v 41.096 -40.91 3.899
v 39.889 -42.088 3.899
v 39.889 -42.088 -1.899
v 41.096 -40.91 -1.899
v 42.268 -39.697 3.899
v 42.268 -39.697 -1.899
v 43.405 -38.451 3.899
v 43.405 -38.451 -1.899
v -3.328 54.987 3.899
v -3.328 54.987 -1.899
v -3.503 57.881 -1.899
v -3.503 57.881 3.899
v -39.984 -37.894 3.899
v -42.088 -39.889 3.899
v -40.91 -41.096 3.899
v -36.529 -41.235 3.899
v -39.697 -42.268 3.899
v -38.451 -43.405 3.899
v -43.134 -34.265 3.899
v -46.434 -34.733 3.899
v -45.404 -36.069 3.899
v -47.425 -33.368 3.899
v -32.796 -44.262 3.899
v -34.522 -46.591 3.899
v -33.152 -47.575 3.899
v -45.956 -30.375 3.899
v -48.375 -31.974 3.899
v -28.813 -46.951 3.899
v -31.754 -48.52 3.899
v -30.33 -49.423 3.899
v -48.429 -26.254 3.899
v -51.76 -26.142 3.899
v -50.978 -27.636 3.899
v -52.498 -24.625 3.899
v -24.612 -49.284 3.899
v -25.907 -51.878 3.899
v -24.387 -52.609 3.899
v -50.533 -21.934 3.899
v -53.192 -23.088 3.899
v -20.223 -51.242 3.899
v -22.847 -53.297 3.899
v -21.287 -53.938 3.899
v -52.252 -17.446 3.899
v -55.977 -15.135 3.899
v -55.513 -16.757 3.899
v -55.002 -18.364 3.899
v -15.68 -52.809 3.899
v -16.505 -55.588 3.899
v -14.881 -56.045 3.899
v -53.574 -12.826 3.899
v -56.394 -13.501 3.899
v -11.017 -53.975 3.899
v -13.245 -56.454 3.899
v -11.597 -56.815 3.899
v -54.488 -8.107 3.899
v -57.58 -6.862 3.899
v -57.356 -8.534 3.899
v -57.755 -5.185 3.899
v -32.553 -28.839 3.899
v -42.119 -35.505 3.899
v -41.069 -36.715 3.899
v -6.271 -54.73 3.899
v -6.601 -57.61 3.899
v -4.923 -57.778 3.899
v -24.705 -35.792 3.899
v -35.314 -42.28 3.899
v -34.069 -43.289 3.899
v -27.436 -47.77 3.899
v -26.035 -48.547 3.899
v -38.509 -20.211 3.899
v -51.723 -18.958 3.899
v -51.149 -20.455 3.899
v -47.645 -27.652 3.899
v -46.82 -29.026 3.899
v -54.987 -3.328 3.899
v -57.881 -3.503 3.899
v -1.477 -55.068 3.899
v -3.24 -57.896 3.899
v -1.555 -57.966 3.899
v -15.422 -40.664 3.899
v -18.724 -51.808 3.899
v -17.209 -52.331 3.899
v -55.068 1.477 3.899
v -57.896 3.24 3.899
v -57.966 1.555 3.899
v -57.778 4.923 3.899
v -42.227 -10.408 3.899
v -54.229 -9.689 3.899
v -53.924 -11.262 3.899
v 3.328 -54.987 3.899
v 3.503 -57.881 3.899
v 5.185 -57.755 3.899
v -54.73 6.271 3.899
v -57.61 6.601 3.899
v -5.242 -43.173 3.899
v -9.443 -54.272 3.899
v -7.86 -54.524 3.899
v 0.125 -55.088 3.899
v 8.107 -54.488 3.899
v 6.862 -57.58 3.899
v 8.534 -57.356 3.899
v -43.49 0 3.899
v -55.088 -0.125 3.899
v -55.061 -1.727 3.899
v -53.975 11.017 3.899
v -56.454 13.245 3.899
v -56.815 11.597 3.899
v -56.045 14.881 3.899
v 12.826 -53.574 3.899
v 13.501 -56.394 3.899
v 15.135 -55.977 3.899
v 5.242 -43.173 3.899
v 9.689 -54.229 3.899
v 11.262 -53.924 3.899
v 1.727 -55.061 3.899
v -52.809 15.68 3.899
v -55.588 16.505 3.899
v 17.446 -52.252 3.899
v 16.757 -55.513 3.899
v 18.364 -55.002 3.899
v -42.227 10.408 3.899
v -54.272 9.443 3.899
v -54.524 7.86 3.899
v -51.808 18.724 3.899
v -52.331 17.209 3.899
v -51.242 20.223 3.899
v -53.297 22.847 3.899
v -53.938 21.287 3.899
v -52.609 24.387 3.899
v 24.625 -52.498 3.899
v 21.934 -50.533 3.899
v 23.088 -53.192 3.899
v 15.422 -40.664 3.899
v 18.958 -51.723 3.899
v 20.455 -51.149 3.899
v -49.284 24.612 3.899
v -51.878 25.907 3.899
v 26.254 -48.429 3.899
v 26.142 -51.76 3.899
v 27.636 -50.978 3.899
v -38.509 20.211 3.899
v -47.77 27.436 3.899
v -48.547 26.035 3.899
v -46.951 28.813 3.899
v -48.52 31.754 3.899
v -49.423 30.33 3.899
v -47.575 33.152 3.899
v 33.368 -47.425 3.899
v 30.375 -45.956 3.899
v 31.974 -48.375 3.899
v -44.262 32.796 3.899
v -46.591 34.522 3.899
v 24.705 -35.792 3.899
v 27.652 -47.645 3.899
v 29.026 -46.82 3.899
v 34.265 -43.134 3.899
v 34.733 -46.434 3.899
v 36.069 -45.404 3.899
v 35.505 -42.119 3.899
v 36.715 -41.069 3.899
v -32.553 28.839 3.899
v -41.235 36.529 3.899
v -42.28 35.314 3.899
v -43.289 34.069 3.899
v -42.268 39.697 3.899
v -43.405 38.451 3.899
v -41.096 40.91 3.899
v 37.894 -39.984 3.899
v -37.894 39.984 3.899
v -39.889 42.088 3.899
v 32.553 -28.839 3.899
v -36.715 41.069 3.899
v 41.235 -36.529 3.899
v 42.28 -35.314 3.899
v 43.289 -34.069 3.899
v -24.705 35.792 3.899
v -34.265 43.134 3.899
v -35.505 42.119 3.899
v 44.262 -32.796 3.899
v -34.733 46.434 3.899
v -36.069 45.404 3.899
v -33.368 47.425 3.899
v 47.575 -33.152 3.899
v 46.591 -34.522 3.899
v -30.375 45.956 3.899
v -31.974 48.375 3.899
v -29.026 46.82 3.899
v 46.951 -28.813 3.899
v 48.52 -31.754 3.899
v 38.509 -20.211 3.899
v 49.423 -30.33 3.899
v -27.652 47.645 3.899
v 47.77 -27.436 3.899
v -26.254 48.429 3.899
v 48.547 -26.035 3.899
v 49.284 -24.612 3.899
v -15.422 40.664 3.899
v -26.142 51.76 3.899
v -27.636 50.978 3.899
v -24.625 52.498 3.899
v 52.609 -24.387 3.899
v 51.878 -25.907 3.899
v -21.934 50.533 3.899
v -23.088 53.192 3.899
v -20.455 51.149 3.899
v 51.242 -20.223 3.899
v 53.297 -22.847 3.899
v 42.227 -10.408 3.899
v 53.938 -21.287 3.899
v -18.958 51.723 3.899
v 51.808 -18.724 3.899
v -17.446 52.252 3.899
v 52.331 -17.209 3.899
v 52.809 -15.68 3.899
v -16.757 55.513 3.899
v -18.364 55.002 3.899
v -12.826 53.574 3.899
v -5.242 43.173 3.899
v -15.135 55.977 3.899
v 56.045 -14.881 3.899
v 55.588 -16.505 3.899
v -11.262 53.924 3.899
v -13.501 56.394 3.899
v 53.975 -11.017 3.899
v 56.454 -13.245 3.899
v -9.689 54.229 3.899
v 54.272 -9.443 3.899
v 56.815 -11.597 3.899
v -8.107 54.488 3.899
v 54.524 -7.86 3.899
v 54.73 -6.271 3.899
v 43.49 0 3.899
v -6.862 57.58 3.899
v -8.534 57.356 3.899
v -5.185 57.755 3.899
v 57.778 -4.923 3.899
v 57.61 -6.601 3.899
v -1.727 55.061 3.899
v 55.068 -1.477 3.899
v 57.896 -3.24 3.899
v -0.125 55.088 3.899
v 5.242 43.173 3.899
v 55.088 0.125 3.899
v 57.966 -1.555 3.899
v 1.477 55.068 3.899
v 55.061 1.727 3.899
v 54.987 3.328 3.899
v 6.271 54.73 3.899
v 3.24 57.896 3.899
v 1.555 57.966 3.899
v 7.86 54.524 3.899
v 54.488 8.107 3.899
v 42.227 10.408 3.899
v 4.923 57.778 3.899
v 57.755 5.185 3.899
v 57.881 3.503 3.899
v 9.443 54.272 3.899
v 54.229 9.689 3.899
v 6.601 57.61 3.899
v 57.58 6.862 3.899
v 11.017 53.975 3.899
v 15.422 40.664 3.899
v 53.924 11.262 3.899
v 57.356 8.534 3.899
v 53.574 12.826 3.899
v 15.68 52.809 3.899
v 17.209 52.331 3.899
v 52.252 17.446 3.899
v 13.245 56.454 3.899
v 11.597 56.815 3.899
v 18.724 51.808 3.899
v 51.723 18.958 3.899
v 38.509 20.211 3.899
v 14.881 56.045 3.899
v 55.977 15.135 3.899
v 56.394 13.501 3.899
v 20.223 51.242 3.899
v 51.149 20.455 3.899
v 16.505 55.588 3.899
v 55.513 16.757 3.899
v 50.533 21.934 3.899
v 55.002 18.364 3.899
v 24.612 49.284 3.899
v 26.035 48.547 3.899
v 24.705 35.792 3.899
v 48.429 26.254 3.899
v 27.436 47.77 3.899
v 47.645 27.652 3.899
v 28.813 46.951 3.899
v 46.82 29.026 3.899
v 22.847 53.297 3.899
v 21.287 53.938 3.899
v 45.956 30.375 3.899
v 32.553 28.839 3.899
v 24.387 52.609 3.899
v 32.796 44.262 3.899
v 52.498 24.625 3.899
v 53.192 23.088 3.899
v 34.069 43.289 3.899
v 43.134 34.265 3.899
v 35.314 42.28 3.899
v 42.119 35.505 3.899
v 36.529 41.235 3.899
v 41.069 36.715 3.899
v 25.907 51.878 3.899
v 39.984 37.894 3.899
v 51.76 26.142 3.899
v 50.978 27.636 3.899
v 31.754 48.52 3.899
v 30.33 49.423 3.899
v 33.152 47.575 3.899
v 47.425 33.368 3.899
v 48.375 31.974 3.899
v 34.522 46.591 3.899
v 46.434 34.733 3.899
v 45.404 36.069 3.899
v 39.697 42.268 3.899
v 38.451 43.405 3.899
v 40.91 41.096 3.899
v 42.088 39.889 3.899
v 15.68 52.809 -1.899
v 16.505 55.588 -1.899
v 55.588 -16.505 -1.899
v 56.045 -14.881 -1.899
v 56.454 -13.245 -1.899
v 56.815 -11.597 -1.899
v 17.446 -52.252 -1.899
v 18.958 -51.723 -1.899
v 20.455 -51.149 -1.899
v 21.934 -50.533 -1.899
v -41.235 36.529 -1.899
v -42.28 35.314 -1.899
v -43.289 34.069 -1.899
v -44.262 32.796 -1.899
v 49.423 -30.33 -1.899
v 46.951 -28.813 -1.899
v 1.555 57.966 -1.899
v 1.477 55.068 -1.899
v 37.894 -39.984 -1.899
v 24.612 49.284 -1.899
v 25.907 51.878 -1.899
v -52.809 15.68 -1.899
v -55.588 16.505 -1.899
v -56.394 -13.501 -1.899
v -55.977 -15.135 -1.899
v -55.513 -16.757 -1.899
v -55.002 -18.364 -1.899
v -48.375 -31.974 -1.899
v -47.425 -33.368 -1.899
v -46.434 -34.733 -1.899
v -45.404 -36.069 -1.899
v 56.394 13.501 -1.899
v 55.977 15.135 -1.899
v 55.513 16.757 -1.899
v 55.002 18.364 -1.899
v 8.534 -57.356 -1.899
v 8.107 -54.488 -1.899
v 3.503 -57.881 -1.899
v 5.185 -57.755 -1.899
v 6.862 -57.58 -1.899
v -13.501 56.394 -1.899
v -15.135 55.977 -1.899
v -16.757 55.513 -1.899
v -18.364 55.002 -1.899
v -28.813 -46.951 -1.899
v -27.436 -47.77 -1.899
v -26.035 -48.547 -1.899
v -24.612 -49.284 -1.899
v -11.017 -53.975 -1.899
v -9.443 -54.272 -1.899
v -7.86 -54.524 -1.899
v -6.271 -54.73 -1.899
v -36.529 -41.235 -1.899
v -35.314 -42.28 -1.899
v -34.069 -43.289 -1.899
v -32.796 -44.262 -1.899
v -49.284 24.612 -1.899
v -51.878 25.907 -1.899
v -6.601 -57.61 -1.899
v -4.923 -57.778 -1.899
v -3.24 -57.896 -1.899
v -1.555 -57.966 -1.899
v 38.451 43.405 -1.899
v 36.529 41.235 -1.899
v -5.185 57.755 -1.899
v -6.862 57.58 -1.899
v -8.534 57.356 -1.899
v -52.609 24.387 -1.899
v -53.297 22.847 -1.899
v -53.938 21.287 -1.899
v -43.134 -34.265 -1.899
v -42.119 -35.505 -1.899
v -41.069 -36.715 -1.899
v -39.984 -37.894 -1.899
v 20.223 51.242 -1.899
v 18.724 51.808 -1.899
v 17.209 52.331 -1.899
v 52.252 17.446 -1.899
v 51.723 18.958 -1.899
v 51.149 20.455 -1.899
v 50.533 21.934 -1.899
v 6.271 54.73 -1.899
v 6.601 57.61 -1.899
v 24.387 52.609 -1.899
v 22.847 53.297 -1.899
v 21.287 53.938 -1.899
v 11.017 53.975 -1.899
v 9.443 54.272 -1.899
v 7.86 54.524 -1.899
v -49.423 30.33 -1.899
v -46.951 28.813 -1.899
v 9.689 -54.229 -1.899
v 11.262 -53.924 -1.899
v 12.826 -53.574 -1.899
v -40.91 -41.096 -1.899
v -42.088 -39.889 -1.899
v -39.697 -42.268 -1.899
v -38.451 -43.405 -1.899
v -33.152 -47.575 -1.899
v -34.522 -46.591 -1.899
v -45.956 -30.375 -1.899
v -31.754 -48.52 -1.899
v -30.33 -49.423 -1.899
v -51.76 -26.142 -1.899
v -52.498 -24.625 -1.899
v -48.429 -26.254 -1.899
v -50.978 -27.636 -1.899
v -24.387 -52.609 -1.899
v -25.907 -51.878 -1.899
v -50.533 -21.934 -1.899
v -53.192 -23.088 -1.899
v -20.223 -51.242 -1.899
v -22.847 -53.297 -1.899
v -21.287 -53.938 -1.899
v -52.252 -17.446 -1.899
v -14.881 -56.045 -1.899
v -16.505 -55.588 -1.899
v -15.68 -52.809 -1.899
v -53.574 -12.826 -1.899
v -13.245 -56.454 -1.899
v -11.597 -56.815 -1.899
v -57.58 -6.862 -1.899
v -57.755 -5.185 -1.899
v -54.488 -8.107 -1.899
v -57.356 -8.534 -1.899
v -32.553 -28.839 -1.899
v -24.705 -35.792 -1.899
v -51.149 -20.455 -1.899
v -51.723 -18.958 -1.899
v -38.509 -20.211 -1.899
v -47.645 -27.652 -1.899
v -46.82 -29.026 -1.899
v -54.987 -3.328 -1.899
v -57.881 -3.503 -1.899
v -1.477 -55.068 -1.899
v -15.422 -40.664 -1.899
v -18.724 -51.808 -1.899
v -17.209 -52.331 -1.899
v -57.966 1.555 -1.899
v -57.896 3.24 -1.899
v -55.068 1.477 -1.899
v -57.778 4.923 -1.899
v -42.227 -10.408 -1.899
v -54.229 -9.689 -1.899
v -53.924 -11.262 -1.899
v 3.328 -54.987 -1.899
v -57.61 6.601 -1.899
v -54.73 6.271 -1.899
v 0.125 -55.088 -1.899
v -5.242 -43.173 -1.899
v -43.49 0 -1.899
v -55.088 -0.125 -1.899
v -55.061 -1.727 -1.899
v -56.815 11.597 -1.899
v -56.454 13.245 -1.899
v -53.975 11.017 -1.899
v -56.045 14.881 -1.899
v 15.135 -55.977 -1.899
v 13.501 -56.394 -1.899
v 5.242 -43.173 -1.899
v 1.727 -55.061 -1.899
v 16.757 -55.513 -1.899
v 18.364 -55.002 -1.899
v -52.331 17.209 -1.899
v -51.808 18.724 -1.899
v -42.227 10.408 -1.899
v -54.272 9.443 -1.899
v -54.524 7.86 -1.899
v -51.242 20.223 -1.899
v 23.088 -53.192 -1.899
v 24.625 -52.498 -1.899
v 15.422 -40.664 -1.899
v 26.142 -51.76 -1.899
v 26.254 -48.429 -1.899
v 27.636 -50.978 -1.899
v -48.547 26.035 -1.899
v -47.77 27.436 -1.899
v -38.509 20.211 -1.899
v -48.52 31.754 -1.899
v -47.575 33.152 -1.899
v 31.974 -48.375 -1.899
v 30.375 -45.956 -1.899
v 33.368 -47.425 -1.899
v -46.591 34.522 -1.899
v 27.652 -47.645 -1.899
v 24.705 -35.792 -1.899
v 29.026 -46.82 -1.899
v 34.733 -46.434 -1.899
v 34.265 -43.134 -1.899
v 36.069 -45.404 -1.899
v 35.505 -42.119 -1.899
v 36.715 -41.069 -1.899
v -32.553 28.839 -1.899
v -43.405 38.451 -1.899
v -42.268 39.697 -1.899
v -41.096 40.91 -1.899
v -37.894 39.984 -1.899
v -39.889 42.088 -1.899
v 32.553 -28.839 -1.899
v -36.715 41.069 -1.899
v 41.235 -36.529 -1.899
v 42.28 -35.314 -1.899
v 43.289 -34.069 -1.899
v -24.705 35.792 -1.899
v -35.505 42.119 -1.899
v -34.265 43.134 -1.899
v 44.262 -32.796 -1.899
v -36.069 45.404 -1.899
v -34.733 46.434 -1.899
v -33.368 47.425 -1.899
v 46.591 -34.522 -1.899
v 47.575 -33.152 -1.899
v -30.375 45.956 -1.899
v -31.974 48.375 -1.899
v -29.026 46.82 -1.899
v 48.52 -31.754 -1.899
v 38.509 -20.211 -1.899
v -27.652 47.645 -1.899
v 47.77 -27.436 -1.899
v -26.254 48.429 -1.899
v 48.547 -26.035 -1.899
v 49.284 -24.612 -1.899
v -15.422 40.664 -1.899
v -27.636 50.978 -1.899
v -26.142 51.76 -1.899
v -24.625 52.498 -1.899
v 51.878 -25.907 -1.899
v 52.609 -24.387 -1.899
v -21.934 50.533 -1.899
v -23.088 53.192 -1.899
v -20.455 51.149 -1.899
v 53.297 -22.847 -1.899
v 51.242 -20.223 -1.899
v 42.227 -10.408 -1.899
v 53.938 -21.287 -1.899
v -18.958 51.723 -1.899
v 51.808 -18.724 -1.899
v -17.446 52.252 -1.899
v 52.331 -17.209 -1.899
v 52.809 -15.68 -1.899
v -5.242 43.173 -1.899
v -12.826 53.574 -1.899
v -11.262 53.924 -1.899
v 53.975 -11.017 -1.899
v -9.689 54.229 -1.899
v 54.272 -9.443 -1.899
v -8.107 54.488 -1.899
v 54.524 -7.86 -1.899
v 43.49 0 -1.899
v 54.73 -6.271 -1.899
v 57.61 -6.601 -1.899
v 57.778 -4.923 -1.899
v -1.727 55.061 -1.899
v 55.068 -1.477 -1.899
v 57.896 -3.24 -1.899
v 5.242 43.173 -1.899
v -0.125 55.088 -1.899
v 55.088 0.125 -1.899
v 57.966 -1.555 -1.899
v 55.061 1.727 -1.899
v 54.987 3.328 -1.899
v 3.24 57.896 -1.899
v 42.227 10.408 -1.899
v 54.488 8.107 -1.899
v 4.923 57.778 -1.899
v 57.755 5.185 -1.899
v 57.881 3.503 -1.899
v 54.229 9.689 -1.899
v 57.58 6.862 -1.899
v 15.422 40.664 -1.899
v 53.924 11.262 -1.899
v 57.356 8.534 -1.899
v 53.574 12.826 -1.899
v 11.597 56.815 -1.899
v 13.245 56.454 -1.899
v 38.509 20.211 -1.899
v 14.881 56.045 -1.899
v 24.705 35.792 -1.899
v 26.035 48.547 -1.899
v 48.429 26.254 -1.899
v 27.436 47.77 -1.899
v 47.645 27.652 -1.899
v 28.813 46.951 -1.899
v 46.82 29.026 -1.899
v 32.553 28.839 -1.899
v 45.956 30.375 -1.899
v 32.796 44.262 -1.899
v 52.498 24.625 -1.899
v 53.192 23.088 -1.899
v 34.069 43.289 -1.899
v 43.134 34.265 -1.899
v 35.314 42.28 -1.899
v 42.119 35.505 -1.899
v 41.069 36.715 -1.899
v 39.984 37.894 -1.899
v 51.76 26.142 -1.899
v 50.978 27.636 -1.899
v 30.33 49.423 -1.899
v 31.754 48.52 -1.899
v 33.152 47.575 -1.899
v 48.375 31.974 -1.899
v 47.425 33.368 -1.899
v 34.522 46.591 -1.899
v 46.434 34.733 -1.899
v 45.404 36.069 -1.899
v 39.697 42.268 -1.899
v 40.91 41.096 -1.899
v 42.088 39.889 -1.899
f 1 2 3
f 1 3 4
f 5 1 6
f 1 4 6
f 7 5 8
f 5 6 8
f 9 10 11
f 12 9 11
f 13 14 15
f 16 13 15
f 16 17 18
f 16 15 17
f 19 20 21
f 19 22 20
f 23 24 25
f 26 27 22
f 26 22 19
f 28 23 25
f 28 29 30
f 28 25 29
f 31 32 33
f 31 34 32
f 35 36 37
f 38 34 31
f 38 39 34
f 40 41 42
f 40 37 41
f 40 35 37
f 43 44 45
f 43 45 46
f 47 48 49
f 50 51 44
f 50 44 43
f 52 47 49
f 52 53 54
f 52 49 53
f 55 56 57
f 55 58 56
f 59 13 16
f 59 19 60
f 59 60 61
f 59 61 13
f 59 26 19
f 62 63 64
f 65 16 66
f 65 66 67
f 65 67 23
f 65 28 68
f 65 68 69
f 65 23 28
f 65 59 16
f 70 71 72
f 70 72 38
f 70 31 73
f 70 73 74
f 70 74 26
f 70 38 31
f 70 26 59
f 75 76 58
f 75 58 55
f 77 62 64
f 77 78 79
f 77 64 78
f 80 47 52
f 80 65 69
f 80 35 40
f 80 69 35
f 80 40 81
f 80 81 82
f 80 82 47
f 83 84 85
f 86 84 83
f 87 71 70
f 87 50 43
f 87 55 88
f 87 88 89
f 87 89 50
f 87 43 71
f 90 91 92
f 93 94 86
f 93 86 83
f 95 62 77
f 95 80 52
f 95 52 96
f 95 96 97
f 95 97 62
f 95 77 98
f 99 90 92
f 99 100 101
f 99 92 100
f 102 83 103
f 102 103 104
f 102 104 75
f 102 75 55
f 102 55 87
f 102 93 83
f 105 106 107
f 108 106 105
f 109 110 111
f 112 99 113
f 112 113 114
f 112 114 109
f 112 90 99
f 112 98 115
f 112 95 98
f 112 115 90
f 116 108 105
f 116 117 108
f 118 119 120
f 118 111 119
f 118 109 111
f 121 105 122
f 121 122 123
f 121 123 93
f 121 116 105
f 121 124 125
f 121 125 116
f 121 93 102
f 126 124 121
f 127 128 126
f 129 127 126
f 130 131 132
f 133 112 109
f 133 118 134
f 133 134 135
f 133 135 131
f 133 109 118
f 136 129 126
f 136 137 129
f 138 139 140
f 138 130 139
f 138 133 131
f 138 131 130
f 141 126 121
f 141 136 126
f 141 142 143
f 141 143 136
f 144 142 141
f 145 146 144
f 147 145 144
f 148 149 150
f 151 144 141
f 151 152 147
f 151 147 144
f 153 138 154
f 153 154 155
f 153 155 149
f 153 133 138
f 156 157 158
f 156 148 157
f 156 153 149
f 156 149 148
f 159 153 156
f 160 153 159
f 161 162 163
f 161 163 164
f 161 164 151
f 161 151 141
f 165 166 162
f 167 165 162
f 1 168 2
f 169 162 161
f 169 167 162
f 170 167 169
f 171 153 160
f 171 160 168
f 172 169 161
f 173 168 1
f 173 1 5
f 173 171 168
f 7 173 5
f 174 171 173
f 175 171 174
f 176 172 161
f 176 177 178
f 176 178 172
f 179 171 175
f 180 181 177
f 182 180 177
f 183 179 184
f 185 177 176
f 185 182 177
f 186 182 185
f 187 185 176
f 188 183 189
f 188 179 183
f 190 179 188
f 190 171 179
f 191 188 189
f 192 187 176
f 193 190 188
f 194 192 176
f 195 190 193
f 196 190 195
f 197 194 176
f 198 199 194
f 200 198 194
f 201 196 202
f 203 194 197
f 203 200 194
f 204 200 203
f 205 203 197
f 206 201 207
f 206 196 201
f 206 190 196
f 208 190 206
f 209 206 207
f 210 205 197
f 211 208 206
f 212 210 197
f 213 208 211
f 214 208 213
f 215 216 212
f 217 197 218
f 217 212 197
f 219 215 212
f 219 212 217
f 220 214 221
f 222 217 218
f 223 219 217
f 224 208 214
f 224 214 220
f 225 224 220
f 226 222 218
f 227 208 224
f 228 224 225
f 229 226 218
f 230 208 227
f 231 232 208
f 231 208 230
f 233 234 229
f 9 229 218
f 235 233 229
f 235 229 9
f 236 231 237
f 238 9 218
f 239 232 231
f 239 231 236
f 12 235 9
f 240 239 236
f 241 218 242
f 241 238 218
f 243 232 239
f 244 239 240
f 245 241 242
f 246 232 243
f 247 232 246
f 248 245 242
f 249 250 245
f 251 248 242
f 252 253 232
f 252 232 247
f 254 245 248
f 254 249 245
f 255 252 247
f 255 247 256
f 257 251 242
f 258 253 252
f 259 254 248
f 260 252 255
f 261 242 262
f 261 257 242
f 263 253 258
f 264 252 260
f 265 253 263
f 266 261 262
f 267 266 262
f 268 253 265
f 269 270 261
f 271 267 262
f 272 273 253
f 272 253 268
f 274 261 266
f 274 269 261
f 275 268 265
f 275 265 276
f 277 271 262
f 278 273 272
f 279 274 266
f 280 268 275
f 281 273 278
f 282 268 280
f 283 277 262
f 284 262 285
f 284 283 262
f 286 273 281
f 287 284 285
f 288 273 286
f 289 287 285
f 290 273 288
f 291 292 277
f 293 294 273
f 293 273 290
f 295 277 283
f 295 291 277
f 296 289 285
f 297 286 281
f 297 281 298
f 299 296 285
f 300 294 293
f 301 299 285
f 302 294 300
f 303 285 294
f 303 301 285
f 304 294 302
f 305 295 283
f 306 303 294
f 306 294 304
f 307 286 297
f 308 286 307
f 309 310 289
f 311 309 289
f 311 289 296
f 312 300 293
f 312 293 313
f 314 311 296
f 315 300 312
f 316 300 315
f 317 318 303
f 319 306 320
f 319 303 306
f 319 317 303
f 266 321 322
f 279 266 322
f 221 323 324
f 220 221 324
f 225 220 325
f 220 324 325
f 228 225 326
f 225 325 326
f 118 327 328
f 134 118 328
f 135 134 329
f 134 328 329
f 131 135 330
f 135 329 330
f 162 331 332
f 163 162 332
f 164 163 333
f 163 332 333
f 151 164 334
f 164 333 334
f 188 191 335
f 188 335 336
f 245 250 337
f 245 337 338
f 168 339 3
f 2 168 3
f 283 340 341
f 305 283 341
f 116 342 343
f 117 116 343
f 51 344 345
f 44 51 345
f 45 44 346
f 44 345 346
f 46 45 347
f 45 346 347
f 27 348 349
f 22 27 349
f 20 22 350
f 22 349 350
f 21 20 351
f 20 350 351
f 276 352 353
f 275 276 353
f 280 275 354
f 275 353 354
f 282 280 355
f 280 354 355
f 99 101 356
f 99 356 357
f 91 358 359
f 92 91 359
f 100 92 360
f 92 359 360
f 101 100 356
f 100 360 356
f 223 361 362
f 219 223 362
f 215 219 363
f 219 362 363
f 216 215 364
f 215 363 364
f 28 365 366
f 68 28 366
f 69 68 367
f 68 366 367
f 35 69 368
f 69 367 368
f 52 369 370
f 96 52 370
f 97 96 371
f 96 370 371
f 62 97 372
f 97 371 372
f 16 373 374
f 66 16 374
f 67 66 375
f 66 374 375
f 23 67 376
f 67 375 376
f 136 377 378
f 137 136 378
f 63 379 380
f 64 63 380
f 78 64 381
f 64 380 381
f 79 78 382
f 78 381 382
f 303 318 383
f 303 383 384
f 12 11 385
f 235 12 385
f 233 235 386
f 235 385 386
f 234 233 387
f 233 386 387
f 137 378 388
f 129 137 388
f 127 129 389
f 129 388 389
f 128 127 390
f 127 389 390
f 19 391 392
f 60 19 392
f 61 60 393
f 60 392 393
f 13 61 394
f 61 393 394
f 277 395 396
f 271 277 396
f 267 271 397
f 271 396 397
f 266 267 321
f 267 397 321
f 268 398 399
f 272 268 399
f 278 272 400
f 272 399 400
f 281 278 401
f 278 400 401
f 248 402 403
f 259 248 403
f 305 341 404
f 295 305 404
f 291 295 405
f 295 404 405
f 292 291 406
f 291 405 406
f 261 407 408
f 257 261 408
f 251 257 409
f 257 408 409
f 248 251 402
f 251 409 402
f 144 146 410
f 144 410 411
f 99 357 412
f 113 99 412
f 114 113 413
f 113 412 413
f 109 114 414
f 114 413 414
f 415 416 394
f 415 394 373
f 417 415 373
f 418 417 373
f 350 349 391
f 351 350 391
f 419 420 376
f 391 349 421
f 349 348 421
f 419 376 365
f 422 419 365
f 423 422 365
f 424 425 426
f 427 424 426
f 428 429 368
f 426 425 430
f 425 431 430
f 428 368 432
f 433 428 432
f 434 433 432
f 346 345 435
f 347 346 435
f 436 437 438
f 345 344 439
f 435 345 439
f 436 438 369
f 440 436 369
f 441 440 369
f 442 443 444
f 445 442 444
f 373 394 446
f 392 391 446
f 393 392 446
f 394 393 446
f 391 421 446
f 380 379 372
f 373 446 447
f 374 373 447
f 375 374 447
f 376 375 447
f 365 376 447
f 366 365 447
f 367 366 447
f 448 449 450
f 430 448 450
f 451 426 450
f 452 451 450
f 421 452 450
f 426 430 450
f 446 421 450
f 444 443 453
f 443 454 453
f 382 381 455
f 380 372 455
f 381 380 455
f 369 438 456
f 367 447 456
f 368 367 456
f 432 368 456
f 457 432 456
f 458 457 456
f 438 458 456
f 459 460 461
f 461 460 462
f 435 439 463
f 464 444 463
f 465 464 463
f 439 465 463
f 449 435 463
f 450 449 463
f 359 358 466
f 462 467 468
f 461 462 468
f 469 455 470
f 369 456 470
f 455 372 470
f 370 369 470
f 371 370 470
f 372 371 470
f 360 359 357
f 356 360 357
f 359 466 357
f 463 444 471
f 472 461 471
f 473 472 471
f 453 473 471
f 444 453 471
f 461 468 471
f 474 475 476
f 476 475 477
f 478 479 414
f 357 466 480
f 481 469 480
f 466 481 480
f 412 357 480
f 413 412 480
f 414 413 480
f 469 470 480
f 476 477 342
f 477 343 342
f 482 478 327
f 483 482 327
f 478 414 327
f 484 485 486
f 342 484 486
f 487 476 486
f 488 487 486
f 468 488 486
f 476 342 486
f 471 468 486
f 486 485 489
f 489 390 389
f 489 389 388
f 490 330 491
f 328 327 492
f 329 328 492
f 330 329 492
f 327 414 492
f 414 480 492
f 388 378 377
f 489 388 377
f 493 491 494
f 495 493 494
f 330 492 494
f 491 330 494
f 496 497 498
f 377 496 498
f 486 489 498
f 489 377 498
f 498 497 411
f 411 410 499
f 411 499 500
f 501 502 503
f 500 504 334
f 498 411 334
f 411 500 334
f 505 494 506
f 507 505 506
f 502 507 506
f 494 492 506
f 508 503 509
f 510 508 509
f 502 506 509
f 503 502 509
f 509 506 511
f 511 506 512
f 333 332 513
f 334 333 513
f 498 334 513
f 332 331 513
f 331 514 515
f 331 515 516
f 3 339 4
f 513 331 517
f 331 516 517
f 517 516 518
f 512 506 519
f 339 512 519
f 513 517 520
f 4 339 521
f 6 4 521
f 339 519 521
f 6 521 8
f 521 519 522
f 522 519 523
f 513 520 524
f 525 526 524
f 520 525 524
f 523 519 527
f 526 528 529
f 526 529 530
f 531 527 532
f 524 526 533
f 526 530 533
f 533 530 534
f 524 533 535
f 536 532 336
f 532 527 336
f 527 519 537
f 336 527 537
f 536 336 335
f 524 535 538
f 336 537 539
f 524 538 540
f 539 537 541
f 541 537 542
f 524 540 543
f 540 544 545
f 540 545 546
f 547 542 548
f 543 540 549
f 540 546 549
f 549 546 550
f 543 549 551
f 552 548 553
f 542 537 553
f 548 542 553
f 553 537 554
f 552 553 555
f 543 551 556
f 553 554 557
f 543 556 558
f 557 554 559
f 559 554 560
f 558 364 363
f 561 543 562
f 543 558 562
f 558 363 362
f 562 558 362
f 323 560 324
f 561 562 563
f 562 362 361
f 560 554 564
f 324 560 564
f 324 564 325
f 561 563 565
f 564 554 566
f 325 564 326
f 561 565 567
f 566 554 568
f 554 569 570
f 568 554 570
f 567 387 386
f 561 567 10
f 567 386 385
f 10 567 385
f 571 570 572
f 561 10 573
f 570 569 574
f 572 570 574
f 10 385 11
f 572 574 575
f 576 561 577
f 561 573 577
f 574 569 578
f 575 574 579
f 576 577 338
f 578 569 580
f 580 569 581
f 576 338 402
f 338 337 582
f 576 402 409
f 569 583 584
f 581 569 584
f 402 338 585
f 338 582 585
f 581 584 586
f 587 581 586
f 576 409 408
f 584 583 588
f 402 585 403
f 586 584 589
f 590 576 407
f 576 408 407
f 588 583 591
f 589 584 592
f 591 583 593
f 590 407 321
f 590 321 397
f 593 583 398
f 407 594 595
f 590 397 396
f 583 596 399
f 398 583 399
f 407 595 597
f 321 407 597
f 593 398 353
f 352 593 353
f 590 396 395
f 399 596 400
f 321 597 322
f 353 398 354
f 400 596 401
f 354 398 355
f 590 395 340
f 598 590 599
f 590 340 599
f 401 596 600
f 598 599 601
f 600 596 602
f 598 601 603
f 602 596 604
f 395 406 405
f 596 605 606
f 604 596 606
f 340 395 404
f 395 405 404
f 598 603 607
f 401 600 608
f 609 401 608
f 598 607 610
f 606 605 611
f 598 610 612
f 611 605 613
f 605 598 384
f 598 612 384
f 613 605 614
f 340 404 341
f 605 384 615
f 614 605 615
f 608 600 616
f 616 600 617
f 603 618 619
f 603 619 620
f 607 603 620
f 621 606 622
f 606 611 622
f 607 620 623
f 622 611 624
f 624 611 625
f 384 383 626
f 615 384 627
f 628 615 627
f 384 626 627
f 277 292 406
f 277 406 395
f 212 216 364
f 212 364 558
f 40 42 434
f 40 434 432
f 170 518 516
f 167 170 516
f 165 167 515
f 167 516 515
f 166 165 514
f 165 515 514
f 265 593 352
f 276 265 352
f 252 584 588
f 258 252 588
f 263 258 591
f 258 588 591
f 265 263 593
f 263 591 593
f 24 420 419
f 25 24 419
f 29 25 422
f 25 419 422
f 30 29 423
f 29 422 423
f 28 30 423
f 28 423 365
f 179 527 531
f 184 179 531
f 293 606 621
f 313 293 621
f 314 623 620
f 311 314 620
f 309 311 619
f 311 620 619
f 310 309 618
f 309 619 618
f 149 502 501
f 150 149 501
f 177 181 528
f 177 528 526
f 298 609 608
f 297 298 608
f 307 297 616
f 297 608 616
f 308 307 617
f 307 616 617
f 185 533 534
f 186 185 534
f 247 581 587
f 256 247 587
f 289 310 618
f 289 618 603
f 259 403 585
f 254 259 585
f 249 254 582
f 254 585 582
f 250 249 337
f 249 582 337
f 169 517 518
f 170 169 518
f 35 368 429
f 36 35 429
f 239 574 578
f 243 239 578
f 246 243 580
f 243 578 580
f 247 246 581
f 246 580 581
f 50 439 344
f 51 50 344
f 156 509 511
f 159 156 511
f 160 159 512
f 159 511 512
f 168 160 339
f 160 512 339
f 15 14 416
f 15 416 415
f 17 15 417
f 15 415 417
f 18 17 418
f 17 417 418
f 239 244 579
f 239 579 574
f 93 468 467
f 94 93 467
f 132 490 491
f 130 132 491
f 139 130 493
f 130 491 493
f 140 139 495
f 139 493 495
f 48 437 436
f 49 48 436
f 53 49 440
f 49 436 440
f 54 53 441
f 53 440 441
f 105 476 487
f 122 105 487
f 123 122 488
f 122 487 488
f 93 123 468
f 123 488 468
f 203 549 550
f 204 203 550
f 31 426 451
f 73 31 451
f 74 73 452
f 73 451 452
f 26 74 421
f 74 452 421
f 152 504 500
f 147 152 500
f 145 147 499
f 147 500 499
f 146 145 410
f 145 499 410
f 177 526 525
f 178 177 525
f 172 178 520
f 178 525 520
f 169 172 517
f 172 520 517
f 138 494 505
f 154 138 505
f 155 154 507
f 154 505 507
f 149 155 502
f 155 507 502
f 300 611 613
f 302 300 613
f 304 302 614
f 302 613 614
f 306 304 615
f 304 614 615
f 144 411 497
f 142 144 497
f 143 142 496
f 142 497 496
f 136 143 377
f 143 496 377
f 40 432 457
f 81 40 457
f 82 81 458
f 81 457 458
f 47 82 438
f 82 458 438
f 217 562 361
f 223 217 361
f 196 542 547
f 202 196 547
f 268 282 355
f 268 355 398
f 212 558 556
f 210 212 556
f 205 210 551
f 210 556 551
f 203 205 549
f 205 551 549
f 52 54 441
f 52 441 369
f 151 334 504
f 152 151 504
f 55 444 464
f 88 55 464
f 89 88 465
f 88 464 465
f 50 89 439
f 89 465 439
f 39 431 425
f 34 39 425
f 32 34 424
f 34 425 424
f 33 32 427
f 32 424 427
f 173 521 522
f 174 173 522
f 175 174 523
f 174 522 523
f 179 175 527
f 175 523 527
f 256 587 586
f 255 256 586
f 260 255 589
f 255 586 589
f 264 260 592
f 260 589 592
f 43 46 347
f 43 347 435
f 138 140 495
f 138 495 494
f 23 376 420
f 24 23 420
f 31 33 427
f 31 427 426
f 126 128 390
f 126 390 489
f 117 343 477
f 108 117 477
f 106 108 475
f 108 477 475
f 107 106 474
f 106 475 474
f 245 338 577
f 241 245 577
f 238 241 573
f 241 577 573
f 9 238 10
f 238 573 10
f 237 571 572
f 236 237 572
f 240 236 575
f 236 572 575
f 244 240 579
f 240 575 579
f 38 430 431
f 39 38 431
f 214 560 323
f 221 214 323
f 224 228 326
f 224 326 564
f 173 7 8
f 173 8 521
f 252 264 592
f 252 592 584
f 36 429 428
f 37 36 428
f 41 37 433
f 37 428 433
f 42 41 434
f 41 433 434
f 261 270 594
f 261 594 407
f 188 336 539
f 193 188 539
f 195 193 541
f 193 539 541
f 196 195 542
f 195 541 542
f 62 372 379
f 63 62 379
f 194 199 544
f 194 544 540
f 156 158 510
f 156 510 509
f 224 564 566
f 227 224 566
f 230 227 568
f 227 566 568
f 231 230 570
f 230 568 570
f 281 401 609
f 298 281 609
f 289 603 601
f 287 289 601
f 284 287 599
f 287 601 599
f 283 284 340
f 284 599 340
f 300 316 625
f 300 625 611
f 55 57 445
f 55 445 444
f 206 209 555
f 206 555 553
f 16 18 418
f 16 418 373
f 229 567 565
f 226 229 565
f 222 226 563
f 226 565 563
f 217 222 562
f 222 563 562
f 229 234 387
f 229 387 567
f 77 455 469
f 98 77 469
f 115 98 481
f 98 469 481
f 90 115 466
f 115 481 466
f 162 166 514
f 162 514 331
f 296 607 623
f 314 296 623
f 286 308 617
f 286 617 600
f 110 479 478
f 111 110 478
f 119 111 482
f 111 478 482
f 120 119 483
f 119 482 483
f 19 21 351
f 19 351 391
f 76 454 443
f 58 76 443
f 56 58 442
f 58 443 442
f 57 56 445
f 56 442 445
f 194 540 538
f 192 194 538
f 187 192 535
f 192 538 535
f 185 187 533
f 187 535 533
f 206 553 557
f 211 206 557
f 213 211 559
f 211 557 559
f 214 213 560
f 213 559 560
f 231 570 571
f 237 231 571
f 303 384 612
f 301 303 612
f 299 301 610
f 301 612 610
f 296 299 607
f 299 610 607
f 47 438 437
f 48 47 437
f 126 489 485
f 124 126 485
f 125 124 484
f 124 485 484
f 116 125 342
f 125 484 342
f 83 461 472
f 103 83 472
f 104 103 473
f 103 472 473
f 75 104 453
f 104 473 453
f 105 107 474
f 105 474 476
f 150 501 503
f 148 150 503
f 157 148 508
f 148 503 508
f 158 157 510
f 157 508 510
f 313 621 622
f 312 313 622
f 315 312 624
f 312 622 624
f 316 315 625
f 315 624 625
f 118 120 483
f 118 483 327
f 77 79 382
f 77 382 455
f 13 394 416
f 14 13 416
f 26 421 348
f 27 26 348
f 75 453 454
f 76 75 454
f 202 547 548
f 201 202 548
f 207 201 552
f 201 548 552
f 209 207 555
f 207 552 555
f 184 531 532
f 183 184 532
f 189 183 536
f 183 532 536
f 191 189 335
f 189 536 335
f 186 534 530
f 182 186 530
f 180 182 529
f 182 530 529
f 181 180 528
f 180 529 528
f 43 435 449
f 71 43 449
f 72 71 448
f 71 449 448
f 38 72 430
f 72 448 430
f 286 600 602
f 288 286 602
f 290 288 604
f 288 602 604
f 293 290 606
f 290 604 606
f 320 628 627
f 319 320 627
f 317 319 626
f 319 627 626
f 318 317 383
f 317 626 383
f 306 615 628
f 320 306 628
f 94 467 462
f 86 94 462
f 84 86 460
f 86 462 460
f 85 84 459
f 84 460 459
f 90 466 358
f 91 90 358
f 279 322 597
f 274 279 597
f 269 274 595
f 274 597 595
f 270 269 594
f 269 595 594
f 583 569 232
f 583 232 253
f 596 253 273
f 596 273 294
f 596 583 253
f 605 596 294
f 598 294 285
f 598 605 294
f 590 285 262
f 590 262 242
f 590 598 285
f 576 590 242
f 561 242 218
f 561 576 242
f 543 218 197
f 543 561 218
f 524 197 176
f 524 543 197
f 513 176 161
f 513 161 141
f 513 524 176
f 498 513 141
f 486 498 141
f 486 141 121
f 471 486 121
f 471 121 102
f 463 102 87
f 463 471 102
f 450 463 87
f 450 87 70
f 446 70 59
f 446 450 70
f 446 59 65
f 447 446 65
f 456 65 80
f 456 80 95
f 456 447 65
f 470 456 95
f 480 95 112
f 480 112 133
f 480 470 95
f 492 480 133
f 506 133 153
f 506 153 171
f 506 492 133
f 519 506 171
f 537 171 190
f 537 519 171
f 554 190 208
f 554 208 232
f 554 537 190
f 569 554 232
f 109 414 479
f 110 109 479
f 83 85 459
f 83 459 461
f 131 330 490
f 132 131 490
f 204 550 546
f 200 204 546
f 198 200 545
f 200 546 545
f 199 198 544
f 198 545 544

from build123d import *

# Parameters (mm, degrees)
SKETCH1_R           = 20
SKETCH1_R_2         = 15
BOSS_EXTRUDE1_DEPTH = 2
CUT_EXTRUDE1_START  = -2
CUT_EXTRUDE1_DEPTH  = 2
CIRPATTERN1_COUNT   = 36
SCALE1_SCALE        = 1.9329
SCALE2_SCALE        = 1.5


with BuildPart() as part:
    # Sketch1 → Boss-Extrude1 (new body)
    with BuildSketch(Plane.XY):
        Circle(SKETCH1_R)
        Circle(SKETCH1_R_2, mode=Mode.SUBTRACT)
    extrude(amount=BOSS_EXTRUDE1_DEPTH)

    # Sketch2 → Cut-Extrude1 (cut)
    with BuildSketch(Plane.XY.offset(2).offset(CUT_EXTRUDE1_START)):
        with BuildLine():
            Line((-18.47787485, -4.423589156), (-19.450394579, -4.656409638))
            ThreePointArc((-19.450394579, -4.656409638), (-19.634991849, -3.803563472), (-19.782212796, -2.943477007))
            Line((-19.782212796, -2.943477007), (-18.793102156, -2.796303156))
            ThreePointArc((-18.793102156, -2.796303156), (-18.653242257, -3.613385298), (-18.47787485, -4.423589156))
        make_face()
    cut_extrude1 = extrude(amount=CUT_EXTRUDE1_DEPTH, mode=Mode.SUBTRACT)

    # CirPattern1: Cut-Extrude1 ×36 about axis
    cirpattern1_axis = Axis((0, 0, 0), (0, 0, 1))
    for i in range(1, CIRPATTERN1_COUNT):
        add(cut_extrude1.rotate(cirpattern1_axis, i * 360 / CIRPATTERN1_COUNT), mode=Mode.SUBTRACT)


with BuildPart() as part_1:
    # Scale1: scaled about (0, 0, 1)
    add(part.part.scale(SCALE1_SCALE).moved(Location((0, 0, -0.9329))))


with BuildPart() as part_2:
    # Scale2: scaled about (0, 0, 1)
    add(part_1.part.scale(SCALE2_SCALE).moved(Location((0, 0, -0.5))))


solid = part_2.part
